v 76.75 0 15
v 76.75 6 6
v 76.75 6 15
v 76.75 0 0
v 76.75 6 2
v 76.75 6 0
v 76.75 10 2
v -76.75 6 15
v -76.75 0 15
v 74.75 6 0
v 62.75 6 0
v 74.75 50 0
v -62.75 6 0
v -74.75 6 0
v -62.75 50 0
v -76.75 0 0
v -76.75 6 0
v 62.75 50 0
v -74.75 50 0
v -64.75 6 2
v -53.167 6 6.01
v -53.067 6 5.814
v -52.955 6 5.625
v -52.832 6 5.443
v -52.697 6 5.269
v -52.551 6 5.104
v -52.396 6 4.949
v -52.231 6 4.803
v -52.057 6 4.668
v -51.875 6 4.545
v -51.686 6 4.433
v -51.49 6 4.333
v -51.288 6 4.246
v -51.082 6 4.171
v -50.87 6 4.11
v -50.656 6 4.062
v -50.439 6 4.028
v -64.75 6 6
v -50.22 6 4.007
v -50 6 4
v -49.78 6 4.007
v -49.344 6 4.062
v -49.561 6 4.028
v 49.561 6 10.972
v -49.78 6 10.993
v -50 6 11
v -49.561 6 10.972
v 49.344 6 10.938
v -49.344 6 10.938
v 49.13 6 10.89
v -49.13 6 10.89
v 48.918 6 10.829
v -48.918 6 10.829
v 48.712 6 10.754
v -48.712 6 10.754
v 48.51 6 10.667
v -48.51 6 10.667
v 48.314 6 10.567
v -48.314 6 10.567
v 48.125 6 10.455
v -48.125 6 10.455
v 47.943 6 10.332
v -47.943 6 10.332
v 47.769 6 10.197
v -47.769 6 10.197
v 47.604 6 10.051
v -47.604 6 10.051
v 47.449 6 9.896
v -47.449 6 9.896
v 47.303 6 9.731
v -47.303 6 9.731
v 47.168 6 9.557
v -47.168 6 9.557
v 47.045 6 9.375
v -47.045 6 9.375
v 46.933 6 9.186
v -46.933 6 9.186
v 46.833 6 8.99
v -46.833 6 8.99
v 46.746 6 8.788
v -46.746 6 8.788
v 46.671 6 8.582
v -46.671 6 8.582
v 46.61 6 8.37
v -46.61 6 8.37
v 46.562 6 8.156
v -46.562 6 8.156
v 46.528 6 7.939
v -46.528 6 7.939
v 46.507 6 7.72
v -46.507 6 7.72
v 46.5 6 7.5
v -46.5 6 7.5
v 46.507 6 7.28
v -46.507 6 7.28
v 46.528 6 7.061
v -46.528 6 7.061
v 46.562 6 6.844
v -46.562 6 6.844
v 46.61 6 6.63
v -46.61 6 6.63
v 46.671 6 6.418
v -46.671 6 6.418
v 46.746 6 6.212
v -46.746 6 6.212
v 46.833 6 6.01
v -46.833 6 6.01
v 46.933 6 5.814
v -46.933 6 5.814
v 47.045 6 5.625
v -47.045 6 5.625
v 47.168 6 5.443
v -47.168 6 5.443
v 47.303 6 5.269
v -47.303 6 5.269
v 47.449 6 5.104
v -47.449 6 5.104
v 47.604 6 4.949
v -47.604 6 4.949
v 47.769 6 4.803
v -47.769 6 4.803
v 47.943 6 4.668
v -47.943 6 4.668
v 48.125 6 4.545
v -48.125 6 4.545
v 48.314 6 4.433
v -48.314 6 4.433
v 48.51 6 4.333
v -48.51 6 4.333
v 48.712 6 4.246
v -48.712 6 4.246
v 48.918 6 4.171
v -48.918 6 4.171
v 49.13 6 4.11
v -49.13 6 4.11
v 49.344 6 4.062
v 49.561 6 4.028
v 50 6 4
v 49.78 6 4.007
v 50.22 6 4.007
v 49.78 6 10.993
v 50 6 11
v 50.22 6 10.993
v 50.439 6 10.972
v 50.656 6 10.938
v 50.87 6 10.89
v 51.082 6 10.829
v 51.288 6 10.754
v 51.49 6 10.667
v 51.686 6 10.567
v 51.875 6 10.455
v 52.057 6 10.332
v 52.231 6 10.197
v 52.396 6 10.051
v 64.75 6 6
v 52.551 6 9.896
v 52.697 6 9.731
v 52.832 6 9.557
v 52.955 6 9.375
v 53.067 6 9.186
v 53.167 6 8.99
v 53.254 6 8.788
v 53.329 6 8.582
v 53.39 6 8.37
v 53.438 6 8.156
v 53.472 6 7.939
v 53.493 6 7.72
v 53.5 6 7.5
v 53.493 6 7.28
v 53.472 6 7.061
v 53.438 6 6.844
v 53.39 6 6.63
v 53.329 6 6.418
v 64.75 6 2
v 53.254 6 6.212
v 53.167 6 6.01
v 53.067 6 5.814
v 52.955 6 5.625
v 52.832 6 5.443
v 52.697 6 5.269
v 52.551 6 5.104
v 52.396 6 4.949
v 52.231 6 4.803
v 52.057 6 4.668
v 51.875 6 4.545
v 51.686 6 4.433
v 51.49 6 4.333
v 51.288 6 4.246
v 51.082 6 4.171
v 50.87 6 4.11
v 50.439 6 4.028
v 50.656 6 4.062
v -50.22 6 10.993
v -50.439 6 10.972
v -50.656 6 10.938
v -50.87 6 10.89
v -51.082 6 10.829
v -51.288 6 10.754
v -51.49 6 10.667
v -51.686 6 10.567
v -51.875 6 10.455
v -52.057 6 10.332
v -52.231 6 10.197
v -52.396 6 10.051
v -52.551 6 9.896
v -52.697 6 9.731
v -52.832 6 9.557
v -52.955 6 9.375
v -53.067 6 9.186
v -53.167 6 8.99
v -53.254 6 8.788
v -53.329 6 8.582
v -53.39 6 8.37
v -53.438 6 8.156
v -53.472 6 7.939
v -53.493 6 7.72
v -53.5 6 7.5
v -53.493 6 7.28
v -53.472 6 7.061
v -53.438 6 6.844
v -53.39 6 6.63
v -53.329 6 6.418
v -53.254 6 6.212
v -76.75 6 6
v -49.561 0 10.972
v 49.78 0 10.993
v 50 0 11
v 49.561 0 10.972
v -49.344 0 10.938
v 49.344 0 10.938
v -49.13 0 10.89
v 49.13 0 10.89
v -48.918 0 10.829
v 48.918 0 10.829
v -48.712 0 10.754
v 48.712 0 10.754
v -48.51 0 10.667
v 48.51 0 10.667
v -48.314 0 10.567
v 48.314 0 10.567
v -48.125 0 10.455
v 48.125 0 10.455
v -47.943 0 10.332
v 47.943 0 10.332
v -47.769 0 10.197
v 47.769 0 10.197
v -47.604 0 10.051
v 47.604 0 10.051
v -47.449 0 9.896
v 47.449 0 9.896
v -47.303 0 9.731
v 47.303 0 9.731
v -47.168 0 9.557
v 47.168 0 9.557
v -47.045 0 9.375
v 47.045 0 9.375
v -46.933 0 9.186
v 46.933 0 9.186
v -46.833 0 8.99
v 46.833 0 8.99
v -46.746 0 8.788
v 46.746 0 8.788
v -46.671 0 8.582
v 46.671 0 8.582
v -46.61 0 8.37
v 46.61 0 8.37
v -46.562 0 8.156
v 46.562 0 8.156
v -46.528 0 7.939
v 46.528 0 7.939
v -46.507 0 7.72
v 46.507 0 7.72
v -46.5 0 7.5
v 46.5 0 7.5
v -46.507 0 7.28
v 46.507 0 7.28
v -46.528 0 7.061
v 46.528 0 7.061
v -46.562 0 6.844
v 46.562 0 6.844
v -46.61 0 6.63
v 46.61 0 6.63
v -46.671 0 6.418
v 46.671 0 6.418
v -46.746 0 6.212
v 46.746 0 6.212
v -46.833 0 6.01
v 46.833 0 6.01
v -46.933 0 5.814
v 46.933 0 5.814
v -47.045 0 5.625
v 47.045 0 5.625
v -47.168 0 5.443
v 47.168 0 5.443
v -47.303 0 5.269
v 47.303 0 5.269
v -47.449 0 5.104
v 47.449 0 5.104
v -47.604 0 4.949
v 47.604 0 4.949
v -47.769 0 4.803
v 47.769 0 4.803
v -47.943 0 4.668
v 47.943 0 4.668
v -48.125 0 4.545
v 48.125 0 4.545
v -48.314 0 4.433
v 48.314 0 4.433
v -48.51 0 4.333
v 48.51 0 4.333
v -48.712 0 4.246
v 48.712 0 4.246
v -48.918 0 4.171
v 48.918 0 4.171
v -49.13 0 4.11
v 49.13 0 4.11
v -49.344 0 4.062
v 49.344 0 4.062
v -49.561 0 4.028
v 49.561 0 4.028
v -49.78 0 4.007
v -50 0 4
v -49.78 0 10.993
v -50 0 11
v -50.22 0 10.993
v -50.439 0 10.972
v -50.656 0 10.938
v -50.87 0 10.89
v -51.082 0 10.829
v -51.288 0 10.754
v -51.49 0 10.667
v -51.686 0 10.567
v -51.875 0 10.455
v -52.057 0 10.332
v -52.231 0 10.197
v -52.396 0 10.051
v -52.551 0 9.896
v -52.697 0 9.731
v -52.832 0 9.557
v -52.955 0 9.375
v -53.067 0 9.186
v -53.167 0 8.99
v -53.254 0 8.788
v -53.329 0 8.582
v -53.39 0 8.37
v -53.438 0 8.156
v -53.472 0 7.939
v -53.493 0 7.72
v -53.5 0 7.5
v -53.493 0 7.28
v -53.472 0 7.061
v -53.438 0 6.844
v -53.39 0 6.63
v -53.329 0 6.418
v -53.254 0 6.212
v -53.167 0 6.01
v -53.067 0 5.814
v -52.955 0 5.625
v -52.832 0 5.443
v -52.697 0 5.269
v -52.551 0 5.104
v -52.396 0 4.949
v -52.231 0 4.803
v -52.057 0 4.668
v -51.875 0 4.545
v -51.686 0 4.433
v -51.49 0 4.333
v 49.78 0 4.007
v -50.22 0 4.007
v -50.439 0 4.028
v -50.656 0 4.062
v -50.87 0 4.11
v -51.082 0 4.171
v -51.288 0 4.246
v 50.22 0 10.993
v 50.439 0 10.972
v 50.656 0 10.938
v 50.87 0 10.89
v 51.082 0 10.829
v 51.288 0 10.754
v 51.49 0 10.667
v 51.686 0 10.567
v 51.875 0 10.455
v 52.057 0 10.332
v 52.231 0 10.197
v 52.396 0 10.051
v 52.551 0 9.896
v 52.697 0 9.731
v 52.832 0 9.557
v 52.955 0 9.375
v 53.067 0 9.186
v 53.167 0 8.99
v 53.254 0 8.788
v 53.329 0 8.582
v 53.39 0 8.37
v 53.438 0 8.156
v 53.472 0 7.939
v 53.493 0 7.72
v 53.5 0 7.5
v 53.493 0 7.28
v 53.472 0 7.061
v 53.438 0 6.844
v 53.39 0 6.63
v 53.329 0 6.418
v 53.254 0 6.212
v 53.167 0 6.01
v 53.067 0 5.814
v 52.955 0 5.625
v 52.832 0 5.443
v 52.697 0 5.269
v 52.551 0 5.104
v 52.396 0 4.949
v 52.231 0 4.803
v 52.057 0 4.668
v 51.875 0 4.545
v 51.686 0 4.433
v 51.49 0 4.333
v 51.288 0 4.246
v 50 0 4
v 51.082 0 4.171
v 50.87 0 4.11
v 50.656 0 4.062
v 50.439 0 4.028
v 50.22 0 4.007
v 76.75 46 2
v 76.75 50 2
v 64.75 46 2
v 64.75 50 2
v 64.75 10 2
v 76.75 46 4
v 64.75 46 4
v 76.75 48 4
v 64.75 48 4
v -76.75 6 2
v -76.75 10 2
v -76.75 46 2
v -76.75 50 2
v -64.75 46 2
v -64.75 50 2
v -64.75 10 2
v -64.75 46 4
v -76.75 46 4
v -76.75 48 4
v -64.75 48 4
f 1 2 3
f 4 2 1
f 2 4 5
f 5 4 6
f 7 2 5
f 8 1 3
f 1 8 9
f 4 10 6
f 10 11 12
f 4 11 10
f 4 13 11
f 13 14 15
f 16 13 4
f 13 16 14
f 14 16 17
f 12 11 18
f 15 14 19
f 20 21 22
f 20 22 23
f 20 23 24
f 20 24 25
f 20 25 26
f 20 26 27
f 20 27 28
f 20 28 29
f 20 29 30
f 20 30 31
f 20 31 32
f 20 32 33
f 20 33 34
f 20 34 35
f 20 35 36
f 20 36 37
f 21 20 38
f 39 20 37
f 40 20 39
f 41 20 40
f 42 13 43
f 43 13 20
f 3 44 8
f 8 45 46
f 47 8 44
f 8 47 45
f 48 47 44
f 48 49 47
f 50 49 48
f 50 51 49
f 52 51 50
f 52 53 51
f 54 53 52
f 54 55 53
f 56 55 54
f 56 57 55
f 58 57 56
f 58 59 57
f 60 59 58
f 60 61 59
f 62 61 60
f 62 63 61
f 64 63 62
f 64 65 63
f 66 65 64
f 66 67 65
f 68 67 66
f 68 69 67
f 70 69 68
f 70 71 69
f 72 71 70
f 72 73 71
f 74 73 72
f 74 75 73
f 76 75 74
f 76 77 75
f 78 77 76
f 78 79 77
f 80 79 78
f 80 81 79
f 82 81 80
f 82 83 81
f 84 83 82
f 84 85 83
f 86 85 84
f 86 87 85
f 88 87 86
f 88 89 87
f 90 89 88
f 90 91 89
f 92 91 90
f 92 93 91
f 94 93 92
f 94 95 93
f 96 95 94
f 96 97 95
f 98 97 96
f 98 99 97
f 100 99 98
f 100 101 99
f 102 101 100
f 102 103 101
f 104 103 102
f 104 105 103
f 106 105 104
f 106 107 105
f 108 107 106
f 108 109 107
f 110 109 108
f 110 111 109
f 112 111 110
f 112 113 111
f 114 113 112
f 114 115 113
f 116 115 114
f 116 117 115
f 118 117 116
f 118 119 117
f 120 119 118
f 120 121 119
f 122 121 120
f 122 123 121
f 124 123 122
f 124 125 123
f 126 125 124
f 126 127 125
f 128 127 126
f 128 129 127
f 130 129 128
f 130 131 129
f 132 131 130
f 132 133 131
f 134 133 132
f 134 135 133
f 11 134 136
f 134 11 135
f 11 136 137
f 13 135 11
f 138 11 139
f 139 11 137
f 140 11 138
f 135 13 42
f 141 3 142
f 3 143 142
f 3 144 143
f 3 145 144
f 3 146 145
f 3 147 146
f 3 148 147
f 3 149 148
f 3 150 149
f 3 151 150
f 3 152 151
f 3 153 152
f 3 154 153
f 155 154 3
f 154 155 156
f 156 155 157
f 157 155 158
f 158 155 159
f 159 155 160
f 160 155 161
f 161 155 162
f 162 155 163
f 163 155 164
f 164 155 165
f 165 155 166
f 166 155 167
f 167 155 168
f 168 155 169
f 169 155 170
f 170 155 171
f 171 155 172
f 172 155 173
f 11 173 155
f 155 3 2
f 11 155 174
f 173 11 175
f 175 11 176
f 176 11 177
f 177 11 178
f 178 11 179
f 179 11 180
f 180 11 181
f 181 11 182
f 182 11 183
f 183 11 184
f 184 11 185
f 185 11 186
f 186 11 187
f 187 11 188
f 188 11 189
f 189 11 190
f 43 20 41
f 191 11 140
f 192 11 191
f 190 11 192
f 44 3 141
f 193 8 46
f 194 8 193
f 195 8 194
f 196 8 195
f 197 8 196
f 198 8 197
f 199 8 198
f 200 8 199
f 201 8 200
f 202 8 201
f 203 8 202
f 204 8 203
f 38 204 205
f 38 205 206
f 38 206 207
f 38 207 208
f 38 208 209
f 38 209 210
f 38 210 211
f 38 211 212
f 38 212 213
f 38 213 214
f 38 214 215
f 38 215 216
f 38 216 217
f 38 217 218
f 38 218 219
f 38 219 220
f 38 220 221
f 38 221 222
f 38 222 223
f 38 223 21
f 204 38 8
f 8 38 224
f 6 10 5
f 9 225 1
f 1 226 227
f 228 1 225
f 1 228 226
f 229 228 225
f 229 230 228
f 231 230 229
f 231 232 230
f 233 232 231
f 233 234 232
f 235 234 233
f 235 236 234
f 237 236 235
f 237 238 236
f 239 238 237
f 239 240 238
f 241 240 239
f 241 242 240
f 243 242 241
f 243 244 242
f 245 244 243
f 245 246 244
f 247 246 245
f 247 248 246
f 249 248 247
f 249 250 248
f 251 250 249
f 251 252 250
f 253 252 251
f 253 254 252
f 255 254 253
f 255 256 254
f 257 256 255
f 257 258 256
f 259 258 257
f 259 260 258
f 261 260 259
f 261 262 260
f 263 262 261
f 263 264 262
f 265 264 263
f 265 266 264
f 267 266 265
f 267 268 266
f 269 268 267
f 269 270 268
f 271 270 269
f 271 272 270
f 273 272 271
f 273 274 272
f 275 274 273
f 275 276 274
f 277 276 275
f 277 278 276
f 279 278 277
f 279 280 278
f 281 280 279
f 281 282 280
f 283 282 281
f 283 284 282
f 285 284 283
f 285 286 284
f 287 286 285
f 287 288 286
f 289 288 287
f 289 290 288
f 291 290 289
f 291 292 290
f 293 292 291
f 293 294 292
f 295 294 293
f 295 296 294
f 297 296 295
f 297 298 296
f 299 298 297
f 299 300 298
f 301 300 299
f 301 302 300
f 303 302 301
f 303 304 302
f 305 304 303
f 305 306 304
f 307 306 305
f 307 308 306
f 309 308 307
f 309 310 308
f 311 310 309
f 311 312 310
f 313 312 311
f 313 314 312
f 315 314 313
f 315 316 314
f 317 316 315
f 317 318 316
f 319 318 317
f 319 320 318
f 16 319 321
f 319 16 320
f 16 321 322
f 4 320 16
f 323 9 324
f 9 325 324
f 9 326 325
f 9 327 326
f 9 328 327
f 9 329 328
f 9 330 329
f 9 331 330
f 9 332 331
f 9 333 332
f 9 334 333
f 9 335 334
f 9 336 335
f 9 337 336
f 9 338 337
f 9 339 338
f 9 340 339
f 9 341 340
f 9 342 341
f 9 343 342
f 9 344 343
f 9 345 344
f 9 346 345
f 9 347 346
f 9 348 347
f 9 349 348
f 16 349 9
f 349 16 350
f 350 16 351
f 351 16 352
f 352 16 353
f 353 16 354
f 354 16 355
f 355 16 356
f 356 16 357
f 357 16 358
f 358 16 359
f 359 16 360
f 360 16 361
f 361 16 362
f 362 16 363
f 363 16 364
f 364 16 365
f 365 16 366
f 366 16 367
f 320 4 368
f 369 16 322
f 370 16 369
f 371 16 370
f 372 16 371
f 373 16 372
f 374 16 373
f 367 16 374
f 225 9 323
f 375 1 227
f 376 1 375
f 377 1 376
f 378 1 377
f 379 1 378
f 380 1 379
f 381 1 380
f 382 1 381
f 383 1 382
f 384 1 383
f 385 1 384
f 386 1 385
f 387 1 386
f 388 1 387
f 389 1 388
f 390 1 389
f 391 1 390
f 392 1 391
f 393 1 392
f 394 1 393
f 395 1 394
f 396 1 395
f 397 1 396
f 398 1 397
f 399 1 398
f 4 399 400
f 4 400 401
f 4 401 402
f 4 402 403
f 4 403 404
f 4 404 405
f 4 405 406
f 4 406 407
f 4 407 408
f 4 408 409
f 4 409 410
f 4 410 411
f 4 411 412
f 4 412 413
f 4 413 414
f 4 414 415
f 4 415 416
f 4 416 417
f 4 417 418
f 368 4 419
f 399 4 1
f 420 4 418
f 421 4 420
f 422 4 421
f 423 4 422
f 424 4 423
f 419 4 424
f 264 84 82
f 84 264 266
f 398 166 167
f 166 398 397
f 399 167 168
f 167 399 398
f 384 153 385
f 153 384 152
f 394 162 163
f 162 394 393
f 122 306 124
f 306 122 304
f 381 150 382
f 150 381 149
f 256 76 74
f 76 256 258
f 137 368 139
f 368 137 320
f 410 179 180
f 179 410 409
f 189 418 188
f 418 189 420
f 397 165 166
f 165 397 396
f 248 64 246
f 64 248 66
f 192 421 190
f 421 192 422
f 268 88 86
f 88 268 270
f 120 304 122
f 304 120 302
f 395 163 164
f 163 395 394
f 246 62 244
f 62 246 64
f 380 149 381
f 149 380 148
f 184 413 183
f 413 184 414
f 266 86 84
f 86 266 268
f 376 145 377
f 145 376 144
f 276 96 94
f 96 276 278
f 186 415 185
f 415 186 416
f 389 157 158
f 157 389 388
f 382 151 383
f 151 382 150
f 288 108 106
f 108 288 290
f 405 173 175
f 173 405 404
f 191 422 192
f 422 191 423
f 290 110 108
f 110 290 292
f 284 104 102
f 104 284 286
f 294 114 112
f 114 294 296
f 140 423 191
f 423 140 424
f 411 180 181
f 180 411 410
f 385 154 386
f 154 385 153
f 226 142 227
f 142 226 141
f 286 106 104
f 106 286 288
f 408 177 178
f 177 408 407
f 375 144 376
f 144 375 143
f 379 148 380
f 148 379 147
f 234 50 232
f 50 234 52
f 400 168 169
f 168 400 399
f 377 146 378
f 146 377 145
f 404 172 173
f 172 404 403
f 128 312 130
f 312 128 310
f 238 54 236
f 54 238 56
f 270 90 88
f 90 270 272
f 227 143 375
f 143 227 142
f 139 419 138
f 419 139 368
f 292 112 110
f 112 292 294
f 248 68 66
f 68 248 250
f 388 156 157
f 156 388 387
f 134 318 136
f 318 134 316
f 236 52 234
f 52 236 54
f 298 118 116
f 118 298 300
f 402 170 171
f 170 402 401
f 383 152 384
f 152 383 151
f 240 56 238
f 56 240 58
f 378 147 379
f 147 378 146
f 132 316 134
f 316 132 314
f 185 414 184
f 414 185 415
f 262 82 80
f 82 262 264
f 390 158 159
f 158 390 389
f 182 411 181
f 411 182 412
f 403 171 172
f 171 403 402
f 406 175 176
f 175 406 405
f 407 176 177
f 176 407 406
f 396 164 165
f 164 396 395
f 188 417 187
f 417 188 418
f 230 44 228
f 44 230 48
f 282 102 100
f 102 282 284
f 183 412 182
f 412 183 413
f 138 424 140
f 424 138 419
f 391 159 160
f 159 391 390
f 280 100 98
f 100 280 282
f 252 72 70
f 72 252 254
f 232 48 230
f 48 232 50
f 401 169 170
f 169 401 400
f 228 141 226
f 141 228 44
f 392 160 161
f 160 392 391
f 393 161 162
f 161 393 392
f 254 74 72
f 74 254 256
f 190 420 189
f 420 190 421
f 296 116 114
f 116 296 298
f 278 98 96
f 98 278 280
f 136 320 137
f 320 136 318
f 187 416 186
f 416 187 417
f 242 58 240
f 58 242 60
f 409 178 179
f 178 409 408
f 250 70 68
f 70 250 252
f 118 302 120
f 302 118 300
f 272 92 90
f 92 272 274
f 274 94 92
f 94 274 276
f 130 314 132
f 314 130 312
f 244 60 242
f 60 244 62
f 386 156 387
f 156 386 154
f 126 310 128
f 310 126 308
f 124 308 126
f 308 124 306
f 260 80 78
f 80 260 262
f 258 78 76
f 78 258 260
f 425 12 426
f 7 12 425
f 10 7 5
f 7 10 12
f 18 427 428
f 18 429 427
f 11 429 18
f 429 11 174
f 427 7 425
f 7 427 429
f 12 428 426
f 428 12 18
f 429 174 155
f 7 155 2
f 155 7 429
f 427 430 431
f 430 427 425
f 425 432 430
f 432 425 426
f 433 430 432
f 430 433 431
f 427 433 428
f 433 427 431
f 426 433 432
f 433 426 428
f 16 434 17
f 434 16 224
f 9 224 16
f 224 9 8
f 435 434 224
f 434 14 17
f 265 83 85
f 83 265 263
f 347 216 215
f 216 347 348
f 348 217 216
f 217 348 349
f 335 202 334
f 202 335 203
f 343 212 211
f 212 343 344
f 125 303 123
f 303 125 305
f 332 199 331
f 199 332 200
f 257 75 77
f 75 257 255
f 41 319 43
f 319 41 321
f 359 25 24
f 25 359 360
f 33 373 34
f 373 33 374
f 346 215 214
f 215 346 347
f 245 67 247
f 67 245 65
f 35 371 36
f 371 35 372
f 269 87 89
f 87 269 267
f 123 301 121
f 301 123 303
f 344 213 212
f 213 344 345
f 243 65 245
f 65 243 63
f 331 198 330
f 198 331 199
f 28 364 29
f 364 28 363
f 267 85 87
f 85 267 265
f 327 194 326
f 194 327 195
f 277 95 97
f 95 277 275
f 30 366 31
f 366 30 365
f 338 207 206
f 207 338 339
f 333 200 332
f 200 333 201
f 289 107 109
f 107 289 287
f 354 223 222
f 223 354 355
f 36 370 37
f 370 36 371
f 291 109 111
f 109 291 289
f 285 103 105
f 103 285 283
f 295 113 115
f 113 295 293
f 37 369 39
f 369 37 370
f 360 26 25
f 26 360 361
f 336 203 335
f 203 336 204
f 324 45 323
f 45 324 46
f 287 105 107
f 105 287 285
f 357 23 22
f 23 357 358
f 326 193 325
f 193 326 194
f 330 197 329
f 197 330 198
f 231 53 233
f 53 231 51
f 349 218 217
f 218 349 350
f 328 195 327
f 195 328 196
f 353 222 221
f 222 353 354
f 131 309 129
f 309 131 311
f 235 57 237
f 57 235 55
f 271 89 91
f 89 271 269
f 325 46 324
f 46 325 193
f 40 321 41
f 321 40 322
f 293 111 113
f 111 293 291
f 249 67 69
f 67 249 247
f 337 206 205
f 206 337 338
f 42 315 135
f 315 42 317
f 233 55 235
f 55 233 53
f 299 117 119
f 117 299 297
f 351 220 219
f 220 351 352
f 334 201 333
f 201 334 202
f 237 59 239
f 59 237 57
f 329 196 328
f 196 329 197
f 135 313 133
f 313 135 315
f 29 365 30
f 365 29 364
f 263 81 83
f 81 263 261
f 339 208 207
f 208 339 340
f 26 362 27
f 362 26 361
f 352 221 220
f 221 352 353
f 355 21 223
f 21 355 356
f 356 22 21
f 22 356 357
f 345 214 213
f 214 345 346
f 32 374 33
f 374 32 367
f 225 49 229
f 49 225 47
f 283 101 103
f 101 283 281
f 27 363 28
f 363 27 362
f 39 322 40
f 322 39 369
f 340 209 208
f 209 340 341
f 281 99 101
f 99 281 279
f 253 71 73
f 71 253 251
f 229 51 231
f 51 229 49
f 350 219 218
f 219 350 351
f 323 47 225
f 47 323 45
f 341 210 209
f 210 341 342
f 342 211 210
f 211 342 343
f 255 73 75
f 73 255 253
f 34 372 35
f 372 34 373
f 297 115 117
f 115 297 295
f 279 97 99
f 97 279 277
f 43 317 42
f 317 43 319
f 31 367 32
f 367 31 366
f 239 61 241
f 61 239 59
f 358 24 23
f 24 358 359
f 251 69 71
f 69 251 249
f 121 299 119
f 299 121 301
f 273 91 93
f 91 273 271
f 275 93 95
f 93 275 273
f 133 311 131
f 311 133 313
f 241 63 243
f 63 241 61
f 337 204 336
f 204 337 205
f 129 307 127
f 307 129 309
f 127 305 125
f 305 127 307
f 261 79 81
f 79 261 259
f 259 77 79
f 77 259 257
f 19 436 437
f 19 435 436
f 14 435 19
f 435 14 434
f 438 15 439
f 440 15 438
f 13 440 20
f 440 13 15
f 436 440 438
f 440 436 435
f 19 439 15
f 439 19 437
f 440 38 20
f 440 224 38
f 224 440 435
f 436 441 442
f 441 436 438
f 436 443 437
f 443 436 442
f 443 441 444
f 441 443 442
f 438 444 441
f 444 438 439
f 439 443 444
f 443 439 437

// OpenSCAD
mirror([1,0,0]) half();

half();

module half() {
  // backplate
  difference() {
  cube([62.75+14, 6, 15]);
  
    rotate([90, 0, 0])
    translate([50, 15/2, -50])
      cylinder(h = 100, d = 7, $fn=100);
  }

  
  // arm
    translate([62.75, 0, 2])
    rotate([270, 0, 0])
linear_extrude(height = 50)
polygon([[2, 0], [0, 2], [12, 2], [14, 0]]);

  // triangular arm support
    rotate([90, 0, 90])
  translate([6, 2, 62.75+14-12])
  linear_extrude(height = 12)
  polygon([[0, 0], [0, 4], [4, 0]]);
  
    // arm hump
  rotate([90, 0, 90])
  translate([50-6, 2, 62.75+14-12])
  linear_extrude(height = 12)
    polygon(points=[[2, 0], [2, 2], [4, 2], [6, 0]]);
  
}
